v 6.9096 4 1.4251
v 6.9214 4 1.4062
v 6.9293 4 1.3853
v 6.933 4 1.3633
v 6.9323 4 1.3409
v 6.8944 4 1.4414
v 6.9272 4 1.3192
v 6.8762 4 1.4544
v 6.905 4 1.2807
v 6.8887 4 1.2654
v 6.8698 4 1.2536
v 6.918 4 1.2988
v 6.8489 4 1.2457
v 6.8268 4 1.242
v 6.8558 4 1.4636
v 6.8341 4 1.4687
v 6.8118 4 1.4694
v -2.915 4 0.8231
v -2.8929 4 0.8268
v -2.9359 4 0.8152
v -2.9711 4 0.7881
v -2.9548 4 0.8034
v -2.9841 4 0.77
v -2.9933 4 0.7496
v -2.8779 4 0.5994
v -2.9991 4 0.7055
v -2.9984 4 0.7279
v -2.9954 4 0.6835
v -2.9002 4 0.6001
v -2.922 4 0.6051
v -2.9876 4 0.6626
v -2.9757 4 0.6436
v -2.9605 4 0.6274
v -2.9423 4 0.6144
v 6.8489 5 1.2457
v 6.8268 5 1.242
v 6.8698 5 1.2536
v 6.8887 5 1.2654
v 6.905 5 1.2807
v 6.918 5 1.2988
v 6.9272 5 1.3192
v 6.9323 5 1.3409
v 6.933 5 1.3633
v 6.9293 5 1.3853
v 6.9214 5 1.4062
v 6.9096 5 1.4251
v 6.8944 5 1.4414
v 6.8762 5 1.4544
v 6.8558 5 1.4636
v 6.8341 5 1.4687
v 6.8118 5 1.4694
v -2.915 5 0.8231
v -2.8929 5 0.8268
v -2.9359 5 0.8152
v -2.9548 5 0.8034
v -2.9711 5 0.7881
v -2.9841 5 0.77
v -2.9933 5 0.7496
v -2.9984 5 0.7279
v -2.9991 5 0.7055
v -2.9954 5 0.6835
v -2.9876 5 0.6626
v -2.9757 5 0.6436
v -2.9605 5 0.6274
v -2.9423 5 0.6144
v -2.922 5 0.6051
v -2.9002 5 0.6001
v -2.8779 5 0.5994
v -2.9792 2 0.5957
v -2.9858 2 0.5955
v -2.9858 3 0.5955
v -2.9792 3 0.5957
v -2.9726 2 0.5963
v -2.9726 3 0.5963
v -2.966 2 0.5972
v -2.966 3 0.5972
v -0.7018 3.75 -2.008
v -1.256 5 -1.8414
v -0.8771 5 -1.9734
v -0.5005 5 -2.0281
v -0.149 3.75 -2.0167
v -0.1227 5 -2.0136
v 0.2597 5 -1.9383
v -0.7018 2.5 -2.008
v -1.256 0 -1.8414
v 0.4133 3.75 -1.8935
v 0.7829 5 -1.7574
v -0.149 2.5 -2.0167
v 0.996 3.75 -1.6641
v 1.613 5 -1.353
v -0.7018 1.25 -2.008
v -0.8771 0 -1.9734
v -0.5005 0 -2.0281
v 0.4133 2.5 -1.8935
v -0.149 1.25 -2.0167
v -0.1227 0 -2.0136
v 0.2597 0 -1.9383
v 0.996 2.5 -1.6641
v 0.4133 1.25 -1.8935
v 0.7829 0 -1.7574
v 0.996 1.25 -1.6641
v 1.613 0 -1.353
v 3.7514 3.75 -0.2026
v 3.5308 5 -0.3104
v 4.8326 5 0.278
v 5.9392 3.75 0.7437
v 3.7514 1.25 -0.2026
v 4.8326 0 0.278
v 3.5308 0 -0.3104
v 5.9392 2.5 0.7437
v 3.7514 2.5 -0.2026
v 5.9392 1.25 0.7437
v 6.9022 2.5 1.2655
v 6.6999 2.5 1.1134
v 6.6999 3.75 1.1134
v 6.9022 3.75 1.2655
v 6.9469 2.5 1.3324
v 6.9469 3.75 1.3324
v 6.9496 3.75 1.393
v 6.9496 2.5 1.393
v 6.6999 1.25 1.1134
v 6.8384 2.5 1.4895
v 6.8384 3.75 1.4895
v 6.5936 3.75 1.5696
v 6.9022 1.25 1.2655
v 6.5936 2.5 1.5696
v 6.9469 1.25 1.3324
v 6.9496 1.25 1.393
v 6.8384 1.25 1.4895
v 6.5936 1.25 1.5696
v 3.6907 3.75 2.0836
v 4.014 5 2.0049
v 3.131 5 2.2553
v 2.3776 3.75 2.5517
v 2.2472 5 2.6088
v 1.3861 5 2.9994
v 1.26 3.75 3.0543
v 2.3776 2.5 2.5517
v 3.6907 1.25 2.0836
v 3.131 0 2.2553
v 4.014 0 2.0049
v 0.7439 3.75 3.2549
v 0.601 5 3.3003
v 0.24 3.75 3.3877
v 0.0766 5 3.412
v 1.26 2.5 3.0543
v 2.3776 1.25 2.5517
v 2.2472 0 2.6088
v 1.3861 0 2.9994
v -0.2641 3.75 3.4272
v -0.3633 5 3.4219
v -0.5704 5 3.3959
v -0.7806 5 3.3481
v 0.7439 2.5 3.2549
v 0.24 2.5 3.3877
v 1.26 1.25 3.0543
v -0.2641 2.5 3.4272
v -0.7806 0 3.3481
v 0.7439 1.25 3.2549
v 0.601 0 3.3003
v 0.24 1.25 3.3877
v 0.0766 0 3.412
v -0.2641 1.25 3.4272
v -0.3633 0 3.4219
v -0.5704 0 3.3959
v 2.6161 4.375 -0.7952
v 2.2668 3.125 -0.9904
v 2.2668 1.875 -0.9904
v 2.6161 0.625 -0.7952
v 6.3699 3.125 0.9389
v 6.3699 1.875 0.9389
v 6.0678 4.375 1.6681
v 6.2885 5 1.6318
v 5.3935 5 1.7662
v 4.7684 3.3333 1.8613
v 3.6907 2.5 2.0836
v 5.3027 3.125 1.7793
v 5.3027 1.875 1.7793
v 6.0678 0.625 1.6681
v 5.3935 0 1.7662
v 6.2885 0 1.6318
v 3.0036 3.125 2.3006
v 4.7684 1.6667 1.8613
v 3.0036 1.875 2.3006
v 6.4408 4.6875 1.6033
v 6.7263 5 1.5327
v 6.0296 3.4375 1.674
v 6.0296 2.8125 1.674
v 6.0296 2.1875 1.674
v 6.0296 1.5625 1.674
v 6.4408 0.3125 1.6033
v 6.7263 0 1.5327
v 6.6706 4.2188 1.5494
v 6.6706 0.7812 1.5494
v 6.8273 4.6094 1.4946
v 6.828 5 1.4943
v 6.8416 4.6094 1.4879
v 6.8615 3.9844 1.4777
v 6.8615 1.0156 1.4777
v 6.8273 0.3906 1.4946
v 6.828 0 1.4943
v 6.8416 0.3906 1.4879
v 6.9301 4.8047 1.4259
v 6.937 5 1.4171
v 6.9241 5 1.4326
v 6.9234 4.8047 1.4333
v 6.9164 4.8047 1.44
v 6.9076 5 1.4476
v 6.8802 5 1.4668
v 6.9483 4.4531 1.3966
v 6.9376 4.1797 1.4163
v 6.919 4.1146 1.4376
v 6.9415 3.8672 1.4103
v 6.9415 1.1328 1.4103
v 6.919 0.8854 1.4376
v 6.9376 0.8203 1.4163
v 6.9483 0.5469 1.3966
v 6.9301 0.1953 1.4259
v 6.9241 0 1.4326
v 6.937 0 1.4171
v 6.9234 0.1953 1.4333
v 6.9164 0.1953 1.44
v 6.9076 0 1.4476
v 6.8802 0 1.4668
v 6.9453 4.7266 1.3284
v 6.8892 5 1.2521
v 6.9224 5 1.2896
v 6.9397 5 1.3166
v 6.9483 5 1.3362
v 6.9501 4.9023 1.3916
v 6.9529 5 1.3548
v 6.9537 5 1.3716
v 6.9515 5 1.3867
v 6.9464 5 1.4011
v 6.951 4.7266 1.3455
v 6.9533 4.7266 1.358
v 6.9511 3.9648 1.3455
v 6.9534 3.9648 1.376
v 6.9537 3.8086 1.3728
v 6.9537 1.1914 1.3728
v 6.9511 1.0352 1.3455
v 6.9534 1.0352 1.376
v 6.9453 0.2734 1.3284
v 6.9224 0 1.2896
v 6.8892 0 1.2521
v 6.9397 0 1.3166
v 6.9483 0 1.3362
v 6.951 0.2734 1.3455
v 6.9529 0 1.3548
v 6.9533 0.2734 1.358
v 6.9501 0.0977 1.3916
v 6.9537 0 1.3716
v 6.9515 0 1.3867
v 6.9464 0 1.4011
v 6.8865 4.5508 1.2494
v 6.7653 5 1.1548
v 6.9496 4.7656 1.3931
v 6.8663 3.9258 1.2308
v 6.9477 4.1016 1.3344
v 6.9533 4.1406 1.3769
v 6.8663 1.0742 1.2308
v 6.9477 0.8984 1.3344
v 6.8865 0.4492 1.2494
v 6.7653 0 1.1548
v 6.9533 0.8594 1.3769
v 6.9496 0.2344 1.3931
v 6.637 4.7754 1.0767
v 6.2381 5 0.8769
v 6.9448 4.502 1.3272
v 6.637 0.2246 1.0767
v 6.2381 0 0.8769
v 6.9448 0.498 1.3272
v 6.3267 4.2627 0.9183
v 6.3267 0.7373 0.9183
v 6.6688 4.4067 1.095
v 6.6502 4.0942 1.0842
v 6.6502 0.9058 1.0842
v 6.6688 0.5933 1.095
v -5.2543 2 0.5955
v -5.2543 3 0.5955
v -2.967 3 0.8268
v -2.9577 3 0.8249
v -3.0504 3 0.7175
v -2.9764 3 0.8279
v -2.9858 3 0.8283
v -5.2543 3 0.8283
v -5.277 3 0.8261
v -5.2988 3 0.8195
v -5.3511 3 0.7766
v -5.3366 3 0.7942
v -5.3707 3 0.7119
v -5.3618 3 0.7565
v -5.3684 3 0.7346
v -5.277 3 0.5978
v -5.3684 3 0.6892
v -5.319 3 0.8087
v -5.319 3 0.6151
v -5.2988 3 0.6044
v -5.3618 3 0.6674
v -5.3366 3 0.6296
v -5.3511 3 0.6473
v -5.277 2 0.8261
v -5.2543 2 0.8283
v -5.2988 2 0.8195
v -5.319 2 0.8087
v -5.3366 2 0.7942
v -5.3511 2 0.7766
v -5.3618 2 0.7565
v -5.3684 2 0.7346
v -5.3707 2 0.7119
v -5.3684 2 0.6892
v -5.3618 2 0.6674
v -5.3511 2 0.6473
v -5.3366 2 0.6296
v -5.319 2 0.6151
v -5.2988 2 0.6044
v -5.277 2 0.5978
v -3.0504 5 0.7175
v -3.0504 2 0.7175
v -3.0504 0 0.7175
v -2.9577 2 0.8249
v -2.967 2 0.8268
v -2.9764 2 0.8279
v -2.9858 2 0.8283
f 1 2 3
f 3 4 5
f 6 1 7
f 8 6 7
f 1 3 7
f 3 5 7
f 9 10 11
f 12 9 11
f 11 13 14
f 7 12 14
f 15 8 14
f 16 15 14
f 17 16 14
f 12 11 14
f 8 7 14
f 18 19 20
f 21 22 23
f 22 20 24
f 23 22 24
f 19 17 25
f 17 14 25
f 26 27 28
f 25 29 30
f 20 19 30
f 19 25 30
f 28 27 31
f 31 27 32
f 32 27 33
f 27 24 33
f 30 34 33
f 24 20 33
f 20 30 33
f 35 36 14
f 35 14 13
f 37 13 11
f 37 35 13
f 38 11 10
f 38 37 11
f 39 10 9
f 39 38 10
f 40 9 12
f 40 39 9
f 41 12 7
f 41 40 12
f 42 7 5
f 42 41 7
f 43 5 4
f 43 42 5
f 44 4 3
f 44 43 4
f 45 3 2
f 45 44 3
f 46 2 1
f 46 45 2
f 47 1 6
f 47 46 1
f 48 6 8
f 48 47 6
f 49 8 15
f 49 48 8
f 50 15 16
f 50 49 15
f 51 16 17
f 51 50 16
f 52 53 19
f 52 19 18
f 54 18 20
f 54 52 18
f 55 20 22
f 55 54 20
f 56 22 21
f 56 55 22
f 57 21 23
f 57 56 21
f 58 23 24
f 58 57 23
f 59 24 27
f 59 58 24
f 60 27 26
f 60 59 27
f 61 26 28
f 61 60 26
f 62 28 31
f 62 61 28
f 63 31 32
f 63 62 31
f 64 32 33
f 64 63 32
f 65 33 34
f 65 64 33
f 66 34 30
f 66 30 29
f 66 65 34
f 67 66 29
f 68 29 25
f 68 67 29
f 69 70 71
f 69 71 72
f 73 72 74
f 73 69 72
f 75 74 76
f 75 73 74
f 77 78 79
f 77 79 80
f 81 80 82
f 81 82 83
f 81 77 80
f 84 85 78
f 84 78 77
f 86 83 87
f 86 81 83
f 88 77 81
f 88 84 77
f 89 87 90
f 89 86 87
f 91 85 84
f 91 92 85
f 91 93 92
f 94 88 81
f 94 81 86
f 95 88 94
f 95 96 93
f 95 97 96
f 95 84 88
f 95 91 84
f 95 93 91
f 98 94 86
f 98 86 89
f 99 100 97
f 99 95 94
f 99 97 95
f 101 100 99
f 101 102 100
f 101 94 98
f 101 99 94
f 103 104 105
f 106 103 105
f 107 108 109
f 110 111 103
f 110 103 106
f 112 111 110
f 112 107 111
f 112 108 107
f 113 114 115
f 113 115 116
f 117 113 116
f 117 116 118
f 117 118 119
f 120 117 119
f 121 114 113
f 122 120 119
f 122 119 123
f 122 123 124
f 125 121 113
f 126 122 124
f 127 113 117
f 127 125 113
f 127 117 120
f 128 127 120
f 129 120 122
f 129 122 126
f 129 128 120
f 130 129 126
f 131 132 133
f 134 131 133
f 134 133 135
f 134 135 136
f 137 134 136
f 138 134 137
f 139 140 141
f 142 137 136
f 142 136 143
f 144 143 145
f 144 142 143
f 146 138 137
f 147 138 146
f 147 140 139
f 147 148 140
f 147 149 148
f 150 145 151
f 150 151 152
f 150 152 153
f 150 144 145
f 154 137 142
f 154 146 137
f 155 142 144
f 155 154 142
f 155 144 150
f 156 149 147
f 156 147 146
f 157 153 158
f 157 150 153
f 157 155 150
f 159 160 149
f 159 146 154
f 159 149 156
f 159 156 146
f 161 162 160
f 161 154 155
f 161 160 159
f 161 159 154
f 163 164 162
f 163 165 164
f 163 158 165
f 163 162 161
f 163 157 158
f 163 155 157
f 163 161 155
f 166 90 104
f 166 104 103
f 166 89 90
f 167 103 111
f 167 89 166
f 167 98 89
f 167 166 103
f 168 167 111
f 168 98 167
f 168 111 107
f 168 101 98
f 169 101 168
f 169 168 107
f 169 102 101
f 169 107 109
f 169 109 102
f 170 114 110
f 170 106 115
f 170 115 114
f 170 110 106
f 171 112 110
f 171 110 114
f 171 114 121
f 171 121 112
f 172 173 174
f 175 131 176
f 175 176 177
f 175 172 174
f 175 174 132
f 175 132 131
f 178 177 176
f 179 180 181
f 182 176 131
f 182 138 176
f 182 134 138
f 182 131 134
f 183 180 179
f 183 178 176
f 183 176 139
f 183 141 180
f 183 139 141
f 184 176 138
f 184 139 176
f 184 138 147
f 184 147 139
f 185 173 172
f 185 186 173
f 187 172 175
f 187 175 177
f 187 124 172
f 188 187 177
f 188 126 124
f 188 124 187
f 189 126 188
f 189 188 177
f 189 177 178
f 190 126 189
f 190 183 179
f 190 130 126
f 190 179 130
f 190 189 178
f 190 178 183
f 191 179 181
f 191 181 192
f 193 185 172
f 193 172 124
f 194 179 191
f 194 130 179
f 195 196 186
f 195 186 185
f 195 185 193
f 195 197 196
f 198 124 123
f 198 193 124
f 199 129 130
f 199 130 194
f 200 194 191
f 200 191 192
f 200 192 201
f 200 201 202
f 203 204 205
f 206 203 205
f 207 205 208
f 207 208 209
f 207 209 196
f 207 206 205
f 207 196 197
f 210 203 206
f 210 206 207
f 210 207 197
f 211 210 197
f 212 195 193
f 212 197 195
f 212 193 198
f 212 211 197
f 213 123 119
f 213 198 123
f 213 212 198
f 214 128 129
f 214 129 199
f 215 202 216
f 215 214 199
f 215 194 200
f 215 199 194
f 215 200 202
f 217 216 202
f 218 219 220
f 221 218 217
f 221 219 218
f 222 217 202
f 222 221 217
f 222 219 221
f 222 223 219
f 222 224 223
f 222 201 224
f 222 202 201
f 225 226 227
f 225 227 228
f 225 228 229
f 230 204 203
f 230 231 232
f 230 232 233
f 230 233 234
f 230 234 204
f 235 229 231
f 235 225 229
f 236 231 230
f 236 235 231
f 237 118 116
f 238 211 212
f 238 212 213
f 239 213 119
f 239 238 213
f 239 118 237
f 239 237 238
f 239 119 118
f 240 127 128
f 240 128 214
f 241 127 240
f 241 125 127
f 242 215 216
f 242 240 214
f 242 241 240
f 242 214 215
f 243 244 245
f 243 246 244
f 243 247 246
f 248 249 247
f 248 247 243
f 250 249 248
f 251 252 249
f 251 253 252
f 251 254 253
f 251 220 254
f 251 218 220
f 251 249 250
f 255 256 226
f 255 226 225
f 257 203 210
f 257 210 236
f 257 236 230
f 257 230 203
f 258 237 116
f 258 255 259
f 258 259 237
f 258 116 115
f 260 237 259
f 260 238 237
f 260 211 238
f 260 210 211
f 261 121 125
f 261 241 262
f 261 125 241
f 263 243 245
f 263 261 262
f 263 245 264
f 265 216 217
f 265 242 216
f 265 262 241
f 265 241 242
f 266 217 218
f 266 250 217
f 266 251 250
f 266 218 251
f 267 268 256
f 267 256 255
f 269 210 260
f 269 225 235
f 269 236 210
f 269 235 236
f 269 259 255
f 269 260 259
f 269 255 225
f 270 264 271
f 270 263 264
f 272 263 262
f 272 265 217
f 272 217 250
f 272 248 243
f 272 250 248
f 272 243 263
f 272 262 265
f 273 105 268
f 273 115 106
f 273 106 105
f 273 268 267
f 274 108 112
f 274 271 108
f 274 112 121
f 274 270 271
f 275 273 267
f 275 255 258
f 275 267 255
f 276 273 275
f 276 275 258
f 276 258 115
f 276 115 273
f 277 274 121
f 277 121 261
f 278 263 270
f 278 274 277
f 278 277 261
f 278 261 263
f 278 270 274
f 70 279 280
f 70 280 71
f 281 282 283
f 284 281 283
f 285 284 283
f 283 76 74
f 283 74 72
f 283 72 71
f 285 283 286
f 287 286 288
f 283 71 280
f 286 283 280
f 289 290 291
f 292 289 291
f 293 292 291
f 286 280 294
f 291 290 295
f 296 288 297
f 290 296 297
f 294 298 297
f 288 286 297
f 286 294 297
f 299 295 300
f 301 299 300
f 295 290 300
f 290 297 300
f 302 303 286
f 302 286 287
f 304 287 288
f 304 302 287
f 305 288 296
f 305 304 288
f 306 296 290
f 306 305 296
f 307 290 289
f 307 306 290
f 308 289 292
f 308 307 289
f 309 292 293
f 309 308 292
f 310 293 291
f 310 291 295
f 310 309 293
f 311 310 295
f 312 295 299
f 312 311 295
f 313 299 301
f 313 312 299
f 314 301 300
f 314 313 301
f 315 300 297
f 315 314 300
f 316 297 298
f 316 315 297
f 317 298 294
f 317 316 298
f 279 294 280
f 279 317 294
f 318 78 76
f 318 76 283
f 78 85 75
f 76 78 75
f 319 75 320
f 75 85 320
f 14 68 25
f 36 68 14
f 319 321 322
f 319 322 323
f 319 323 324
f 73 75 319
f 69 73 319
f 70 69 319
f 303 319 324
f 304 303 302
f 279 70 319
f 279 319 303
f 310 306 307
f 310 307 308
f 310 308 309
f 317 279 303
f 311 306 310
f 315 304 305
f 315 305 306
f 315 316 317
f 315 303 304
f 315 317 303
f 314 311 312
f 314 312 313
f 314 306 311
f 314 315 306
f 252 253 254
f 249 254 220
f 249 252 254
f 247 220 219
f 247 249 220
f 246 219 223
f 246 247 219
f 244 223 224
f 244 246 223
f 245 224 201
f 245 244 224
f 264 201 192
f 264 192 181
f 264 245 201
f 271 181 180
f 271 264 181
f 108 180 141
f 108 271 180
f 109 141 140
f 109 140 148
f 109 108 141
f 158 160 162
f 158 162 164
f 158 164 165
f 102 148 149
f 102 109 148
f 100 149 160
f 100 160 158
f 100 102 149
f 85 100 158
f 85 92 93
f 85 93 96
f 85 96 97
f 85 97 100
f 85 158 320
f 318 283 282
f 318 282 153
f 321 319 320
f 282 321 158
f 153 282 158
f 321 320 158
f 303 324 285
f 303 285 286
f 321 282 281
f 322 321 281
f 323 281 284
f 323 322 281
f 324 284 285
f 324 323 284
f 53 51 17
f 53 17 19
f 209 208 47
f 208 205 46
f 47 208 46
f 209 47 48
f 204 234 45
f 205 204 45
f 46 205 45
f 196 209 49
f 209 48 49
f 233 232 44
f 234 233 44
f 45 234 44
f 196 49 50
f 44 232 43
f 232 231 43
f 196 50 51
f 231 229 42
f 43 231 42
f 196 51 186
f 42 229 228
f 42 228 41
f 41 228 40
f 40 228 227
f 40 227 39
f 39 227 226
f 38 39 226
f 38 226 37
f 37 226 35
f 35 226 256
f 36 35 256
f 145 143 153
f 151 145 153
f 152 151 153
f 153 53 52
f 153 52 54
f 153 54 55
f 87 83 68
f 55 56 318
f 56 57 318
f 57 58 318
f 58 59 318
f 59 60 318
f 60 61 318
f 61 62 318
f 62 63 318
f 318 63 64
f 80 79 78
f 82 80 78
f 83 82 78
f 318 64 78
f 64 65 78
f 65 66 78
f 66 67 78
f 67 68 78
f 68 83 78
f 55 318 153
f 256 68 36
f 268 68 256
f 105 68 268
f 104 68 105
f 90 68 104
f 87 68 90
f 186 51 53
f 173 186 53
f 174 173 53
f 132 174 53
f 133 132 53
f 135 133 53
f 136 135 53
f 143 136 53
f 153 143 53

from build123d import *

# Parameters (mm, degrees)
BOSS_EXTRUDE3_DEPTH      = 5
CUT_EXTRUDE1_DEPTH       = 1
BOSS_EXTRUDE5_DEPTH      = 0.5
BOSS_EXTRUDE5_DEPTH_BACK = 0.5


with BuildPart() as part:
    # Sketch6 → Boss-Extrude3 (new body)
    with BuildSketch(Plane(origin=(0, 0, 0), x_dir=(1, 0, 0), z_dir=(0, 1, 0))):
        with BuildLine():
            add(Edge.make_bspline(
                [(-1.256039449, 1.841417614), (0.233794125, 2.519006442), (2.510618748, 0.36770734), (8.764915625, -1.635448525), (2.584650338, -1.772742295), (0.624065698, -3.740030696), (-0.780587173, -3.3480934)],
                knots=[0.133444497, 0.133444497, 0.133444497, 0.133444497, 0.358406605, 0.511014145, 0.653251299, 0.851650171, 0.851650171, 0.851650171, 0.851650171], degree=3))
            Line((-1.256039449, 1.841417614), (-3.050385484, -0.717530514))
            Line((-3.050385484, -0.717530514), (-0.780587173, -3.3480934))
        make_face()
    extrude(amount=BOSS_EXTRUDE3_DEPTH)

    # Sketch7 → Cut-Extrude1 (cut)
    with BuildSketch(Plane(origin=(0, 5, 0), x_dir=(1, 0, 0), z_dir=(0, 1, 0))):
        with BuildLine():
            Line((-2.877871497, -0.599374404), (6.826819959, -1.242030763))
            ThreePointArc((6.826819959, -1.242030763), (6.932983359, -1.363251838), (6.811762285, -1.469415239))
            Line((6.811762285, -1.469415239), (-2.892929171, -0.826758879))
            ThreePointArc((-2.892929171, -0.826758879), (-2.999092572, -0.705537804), (-2.877871497, -0.599374404))
        make_face()
    extrude(amount=-CUT_EXTRUDE1_DEPTH, mode=Mode.SUBTRACT)

    # Sketch9 → Boss-Extrude5 (add, two sides: drawn at the far end of the back side and taken through both)
    with BuildSketch(Plane(origin=(0, 2.5, 0), x_dir=(1, 0, 0), z_dir=(0, 1, 0)).offset(-BOSS_EXTRUDE5_DEPTH_BACK)):
        with BuildLine():
            Line((-2.985816802, -0.828326194), (-5.254284336, -0.828326194))
            ThreePointArc((-5.254284336, -0.828326194), (-5.370682329, -0.711928202), (-5.254284336, -0.59553021))
            Line((-5.254284336, -0.59553021), (-2.985816802, -0.59553021))
            ThreePointArc((-2.985816802, -0.59553021), (-2.86941881, -0.711928202), (-2.985816802, -0.828326194))
        make_face()
    extrude(amount=BOSS_EXTRUDE5_DEPTH + BOSS_EXTRUDE5_DEPTH_BACK)


solid = part.part
